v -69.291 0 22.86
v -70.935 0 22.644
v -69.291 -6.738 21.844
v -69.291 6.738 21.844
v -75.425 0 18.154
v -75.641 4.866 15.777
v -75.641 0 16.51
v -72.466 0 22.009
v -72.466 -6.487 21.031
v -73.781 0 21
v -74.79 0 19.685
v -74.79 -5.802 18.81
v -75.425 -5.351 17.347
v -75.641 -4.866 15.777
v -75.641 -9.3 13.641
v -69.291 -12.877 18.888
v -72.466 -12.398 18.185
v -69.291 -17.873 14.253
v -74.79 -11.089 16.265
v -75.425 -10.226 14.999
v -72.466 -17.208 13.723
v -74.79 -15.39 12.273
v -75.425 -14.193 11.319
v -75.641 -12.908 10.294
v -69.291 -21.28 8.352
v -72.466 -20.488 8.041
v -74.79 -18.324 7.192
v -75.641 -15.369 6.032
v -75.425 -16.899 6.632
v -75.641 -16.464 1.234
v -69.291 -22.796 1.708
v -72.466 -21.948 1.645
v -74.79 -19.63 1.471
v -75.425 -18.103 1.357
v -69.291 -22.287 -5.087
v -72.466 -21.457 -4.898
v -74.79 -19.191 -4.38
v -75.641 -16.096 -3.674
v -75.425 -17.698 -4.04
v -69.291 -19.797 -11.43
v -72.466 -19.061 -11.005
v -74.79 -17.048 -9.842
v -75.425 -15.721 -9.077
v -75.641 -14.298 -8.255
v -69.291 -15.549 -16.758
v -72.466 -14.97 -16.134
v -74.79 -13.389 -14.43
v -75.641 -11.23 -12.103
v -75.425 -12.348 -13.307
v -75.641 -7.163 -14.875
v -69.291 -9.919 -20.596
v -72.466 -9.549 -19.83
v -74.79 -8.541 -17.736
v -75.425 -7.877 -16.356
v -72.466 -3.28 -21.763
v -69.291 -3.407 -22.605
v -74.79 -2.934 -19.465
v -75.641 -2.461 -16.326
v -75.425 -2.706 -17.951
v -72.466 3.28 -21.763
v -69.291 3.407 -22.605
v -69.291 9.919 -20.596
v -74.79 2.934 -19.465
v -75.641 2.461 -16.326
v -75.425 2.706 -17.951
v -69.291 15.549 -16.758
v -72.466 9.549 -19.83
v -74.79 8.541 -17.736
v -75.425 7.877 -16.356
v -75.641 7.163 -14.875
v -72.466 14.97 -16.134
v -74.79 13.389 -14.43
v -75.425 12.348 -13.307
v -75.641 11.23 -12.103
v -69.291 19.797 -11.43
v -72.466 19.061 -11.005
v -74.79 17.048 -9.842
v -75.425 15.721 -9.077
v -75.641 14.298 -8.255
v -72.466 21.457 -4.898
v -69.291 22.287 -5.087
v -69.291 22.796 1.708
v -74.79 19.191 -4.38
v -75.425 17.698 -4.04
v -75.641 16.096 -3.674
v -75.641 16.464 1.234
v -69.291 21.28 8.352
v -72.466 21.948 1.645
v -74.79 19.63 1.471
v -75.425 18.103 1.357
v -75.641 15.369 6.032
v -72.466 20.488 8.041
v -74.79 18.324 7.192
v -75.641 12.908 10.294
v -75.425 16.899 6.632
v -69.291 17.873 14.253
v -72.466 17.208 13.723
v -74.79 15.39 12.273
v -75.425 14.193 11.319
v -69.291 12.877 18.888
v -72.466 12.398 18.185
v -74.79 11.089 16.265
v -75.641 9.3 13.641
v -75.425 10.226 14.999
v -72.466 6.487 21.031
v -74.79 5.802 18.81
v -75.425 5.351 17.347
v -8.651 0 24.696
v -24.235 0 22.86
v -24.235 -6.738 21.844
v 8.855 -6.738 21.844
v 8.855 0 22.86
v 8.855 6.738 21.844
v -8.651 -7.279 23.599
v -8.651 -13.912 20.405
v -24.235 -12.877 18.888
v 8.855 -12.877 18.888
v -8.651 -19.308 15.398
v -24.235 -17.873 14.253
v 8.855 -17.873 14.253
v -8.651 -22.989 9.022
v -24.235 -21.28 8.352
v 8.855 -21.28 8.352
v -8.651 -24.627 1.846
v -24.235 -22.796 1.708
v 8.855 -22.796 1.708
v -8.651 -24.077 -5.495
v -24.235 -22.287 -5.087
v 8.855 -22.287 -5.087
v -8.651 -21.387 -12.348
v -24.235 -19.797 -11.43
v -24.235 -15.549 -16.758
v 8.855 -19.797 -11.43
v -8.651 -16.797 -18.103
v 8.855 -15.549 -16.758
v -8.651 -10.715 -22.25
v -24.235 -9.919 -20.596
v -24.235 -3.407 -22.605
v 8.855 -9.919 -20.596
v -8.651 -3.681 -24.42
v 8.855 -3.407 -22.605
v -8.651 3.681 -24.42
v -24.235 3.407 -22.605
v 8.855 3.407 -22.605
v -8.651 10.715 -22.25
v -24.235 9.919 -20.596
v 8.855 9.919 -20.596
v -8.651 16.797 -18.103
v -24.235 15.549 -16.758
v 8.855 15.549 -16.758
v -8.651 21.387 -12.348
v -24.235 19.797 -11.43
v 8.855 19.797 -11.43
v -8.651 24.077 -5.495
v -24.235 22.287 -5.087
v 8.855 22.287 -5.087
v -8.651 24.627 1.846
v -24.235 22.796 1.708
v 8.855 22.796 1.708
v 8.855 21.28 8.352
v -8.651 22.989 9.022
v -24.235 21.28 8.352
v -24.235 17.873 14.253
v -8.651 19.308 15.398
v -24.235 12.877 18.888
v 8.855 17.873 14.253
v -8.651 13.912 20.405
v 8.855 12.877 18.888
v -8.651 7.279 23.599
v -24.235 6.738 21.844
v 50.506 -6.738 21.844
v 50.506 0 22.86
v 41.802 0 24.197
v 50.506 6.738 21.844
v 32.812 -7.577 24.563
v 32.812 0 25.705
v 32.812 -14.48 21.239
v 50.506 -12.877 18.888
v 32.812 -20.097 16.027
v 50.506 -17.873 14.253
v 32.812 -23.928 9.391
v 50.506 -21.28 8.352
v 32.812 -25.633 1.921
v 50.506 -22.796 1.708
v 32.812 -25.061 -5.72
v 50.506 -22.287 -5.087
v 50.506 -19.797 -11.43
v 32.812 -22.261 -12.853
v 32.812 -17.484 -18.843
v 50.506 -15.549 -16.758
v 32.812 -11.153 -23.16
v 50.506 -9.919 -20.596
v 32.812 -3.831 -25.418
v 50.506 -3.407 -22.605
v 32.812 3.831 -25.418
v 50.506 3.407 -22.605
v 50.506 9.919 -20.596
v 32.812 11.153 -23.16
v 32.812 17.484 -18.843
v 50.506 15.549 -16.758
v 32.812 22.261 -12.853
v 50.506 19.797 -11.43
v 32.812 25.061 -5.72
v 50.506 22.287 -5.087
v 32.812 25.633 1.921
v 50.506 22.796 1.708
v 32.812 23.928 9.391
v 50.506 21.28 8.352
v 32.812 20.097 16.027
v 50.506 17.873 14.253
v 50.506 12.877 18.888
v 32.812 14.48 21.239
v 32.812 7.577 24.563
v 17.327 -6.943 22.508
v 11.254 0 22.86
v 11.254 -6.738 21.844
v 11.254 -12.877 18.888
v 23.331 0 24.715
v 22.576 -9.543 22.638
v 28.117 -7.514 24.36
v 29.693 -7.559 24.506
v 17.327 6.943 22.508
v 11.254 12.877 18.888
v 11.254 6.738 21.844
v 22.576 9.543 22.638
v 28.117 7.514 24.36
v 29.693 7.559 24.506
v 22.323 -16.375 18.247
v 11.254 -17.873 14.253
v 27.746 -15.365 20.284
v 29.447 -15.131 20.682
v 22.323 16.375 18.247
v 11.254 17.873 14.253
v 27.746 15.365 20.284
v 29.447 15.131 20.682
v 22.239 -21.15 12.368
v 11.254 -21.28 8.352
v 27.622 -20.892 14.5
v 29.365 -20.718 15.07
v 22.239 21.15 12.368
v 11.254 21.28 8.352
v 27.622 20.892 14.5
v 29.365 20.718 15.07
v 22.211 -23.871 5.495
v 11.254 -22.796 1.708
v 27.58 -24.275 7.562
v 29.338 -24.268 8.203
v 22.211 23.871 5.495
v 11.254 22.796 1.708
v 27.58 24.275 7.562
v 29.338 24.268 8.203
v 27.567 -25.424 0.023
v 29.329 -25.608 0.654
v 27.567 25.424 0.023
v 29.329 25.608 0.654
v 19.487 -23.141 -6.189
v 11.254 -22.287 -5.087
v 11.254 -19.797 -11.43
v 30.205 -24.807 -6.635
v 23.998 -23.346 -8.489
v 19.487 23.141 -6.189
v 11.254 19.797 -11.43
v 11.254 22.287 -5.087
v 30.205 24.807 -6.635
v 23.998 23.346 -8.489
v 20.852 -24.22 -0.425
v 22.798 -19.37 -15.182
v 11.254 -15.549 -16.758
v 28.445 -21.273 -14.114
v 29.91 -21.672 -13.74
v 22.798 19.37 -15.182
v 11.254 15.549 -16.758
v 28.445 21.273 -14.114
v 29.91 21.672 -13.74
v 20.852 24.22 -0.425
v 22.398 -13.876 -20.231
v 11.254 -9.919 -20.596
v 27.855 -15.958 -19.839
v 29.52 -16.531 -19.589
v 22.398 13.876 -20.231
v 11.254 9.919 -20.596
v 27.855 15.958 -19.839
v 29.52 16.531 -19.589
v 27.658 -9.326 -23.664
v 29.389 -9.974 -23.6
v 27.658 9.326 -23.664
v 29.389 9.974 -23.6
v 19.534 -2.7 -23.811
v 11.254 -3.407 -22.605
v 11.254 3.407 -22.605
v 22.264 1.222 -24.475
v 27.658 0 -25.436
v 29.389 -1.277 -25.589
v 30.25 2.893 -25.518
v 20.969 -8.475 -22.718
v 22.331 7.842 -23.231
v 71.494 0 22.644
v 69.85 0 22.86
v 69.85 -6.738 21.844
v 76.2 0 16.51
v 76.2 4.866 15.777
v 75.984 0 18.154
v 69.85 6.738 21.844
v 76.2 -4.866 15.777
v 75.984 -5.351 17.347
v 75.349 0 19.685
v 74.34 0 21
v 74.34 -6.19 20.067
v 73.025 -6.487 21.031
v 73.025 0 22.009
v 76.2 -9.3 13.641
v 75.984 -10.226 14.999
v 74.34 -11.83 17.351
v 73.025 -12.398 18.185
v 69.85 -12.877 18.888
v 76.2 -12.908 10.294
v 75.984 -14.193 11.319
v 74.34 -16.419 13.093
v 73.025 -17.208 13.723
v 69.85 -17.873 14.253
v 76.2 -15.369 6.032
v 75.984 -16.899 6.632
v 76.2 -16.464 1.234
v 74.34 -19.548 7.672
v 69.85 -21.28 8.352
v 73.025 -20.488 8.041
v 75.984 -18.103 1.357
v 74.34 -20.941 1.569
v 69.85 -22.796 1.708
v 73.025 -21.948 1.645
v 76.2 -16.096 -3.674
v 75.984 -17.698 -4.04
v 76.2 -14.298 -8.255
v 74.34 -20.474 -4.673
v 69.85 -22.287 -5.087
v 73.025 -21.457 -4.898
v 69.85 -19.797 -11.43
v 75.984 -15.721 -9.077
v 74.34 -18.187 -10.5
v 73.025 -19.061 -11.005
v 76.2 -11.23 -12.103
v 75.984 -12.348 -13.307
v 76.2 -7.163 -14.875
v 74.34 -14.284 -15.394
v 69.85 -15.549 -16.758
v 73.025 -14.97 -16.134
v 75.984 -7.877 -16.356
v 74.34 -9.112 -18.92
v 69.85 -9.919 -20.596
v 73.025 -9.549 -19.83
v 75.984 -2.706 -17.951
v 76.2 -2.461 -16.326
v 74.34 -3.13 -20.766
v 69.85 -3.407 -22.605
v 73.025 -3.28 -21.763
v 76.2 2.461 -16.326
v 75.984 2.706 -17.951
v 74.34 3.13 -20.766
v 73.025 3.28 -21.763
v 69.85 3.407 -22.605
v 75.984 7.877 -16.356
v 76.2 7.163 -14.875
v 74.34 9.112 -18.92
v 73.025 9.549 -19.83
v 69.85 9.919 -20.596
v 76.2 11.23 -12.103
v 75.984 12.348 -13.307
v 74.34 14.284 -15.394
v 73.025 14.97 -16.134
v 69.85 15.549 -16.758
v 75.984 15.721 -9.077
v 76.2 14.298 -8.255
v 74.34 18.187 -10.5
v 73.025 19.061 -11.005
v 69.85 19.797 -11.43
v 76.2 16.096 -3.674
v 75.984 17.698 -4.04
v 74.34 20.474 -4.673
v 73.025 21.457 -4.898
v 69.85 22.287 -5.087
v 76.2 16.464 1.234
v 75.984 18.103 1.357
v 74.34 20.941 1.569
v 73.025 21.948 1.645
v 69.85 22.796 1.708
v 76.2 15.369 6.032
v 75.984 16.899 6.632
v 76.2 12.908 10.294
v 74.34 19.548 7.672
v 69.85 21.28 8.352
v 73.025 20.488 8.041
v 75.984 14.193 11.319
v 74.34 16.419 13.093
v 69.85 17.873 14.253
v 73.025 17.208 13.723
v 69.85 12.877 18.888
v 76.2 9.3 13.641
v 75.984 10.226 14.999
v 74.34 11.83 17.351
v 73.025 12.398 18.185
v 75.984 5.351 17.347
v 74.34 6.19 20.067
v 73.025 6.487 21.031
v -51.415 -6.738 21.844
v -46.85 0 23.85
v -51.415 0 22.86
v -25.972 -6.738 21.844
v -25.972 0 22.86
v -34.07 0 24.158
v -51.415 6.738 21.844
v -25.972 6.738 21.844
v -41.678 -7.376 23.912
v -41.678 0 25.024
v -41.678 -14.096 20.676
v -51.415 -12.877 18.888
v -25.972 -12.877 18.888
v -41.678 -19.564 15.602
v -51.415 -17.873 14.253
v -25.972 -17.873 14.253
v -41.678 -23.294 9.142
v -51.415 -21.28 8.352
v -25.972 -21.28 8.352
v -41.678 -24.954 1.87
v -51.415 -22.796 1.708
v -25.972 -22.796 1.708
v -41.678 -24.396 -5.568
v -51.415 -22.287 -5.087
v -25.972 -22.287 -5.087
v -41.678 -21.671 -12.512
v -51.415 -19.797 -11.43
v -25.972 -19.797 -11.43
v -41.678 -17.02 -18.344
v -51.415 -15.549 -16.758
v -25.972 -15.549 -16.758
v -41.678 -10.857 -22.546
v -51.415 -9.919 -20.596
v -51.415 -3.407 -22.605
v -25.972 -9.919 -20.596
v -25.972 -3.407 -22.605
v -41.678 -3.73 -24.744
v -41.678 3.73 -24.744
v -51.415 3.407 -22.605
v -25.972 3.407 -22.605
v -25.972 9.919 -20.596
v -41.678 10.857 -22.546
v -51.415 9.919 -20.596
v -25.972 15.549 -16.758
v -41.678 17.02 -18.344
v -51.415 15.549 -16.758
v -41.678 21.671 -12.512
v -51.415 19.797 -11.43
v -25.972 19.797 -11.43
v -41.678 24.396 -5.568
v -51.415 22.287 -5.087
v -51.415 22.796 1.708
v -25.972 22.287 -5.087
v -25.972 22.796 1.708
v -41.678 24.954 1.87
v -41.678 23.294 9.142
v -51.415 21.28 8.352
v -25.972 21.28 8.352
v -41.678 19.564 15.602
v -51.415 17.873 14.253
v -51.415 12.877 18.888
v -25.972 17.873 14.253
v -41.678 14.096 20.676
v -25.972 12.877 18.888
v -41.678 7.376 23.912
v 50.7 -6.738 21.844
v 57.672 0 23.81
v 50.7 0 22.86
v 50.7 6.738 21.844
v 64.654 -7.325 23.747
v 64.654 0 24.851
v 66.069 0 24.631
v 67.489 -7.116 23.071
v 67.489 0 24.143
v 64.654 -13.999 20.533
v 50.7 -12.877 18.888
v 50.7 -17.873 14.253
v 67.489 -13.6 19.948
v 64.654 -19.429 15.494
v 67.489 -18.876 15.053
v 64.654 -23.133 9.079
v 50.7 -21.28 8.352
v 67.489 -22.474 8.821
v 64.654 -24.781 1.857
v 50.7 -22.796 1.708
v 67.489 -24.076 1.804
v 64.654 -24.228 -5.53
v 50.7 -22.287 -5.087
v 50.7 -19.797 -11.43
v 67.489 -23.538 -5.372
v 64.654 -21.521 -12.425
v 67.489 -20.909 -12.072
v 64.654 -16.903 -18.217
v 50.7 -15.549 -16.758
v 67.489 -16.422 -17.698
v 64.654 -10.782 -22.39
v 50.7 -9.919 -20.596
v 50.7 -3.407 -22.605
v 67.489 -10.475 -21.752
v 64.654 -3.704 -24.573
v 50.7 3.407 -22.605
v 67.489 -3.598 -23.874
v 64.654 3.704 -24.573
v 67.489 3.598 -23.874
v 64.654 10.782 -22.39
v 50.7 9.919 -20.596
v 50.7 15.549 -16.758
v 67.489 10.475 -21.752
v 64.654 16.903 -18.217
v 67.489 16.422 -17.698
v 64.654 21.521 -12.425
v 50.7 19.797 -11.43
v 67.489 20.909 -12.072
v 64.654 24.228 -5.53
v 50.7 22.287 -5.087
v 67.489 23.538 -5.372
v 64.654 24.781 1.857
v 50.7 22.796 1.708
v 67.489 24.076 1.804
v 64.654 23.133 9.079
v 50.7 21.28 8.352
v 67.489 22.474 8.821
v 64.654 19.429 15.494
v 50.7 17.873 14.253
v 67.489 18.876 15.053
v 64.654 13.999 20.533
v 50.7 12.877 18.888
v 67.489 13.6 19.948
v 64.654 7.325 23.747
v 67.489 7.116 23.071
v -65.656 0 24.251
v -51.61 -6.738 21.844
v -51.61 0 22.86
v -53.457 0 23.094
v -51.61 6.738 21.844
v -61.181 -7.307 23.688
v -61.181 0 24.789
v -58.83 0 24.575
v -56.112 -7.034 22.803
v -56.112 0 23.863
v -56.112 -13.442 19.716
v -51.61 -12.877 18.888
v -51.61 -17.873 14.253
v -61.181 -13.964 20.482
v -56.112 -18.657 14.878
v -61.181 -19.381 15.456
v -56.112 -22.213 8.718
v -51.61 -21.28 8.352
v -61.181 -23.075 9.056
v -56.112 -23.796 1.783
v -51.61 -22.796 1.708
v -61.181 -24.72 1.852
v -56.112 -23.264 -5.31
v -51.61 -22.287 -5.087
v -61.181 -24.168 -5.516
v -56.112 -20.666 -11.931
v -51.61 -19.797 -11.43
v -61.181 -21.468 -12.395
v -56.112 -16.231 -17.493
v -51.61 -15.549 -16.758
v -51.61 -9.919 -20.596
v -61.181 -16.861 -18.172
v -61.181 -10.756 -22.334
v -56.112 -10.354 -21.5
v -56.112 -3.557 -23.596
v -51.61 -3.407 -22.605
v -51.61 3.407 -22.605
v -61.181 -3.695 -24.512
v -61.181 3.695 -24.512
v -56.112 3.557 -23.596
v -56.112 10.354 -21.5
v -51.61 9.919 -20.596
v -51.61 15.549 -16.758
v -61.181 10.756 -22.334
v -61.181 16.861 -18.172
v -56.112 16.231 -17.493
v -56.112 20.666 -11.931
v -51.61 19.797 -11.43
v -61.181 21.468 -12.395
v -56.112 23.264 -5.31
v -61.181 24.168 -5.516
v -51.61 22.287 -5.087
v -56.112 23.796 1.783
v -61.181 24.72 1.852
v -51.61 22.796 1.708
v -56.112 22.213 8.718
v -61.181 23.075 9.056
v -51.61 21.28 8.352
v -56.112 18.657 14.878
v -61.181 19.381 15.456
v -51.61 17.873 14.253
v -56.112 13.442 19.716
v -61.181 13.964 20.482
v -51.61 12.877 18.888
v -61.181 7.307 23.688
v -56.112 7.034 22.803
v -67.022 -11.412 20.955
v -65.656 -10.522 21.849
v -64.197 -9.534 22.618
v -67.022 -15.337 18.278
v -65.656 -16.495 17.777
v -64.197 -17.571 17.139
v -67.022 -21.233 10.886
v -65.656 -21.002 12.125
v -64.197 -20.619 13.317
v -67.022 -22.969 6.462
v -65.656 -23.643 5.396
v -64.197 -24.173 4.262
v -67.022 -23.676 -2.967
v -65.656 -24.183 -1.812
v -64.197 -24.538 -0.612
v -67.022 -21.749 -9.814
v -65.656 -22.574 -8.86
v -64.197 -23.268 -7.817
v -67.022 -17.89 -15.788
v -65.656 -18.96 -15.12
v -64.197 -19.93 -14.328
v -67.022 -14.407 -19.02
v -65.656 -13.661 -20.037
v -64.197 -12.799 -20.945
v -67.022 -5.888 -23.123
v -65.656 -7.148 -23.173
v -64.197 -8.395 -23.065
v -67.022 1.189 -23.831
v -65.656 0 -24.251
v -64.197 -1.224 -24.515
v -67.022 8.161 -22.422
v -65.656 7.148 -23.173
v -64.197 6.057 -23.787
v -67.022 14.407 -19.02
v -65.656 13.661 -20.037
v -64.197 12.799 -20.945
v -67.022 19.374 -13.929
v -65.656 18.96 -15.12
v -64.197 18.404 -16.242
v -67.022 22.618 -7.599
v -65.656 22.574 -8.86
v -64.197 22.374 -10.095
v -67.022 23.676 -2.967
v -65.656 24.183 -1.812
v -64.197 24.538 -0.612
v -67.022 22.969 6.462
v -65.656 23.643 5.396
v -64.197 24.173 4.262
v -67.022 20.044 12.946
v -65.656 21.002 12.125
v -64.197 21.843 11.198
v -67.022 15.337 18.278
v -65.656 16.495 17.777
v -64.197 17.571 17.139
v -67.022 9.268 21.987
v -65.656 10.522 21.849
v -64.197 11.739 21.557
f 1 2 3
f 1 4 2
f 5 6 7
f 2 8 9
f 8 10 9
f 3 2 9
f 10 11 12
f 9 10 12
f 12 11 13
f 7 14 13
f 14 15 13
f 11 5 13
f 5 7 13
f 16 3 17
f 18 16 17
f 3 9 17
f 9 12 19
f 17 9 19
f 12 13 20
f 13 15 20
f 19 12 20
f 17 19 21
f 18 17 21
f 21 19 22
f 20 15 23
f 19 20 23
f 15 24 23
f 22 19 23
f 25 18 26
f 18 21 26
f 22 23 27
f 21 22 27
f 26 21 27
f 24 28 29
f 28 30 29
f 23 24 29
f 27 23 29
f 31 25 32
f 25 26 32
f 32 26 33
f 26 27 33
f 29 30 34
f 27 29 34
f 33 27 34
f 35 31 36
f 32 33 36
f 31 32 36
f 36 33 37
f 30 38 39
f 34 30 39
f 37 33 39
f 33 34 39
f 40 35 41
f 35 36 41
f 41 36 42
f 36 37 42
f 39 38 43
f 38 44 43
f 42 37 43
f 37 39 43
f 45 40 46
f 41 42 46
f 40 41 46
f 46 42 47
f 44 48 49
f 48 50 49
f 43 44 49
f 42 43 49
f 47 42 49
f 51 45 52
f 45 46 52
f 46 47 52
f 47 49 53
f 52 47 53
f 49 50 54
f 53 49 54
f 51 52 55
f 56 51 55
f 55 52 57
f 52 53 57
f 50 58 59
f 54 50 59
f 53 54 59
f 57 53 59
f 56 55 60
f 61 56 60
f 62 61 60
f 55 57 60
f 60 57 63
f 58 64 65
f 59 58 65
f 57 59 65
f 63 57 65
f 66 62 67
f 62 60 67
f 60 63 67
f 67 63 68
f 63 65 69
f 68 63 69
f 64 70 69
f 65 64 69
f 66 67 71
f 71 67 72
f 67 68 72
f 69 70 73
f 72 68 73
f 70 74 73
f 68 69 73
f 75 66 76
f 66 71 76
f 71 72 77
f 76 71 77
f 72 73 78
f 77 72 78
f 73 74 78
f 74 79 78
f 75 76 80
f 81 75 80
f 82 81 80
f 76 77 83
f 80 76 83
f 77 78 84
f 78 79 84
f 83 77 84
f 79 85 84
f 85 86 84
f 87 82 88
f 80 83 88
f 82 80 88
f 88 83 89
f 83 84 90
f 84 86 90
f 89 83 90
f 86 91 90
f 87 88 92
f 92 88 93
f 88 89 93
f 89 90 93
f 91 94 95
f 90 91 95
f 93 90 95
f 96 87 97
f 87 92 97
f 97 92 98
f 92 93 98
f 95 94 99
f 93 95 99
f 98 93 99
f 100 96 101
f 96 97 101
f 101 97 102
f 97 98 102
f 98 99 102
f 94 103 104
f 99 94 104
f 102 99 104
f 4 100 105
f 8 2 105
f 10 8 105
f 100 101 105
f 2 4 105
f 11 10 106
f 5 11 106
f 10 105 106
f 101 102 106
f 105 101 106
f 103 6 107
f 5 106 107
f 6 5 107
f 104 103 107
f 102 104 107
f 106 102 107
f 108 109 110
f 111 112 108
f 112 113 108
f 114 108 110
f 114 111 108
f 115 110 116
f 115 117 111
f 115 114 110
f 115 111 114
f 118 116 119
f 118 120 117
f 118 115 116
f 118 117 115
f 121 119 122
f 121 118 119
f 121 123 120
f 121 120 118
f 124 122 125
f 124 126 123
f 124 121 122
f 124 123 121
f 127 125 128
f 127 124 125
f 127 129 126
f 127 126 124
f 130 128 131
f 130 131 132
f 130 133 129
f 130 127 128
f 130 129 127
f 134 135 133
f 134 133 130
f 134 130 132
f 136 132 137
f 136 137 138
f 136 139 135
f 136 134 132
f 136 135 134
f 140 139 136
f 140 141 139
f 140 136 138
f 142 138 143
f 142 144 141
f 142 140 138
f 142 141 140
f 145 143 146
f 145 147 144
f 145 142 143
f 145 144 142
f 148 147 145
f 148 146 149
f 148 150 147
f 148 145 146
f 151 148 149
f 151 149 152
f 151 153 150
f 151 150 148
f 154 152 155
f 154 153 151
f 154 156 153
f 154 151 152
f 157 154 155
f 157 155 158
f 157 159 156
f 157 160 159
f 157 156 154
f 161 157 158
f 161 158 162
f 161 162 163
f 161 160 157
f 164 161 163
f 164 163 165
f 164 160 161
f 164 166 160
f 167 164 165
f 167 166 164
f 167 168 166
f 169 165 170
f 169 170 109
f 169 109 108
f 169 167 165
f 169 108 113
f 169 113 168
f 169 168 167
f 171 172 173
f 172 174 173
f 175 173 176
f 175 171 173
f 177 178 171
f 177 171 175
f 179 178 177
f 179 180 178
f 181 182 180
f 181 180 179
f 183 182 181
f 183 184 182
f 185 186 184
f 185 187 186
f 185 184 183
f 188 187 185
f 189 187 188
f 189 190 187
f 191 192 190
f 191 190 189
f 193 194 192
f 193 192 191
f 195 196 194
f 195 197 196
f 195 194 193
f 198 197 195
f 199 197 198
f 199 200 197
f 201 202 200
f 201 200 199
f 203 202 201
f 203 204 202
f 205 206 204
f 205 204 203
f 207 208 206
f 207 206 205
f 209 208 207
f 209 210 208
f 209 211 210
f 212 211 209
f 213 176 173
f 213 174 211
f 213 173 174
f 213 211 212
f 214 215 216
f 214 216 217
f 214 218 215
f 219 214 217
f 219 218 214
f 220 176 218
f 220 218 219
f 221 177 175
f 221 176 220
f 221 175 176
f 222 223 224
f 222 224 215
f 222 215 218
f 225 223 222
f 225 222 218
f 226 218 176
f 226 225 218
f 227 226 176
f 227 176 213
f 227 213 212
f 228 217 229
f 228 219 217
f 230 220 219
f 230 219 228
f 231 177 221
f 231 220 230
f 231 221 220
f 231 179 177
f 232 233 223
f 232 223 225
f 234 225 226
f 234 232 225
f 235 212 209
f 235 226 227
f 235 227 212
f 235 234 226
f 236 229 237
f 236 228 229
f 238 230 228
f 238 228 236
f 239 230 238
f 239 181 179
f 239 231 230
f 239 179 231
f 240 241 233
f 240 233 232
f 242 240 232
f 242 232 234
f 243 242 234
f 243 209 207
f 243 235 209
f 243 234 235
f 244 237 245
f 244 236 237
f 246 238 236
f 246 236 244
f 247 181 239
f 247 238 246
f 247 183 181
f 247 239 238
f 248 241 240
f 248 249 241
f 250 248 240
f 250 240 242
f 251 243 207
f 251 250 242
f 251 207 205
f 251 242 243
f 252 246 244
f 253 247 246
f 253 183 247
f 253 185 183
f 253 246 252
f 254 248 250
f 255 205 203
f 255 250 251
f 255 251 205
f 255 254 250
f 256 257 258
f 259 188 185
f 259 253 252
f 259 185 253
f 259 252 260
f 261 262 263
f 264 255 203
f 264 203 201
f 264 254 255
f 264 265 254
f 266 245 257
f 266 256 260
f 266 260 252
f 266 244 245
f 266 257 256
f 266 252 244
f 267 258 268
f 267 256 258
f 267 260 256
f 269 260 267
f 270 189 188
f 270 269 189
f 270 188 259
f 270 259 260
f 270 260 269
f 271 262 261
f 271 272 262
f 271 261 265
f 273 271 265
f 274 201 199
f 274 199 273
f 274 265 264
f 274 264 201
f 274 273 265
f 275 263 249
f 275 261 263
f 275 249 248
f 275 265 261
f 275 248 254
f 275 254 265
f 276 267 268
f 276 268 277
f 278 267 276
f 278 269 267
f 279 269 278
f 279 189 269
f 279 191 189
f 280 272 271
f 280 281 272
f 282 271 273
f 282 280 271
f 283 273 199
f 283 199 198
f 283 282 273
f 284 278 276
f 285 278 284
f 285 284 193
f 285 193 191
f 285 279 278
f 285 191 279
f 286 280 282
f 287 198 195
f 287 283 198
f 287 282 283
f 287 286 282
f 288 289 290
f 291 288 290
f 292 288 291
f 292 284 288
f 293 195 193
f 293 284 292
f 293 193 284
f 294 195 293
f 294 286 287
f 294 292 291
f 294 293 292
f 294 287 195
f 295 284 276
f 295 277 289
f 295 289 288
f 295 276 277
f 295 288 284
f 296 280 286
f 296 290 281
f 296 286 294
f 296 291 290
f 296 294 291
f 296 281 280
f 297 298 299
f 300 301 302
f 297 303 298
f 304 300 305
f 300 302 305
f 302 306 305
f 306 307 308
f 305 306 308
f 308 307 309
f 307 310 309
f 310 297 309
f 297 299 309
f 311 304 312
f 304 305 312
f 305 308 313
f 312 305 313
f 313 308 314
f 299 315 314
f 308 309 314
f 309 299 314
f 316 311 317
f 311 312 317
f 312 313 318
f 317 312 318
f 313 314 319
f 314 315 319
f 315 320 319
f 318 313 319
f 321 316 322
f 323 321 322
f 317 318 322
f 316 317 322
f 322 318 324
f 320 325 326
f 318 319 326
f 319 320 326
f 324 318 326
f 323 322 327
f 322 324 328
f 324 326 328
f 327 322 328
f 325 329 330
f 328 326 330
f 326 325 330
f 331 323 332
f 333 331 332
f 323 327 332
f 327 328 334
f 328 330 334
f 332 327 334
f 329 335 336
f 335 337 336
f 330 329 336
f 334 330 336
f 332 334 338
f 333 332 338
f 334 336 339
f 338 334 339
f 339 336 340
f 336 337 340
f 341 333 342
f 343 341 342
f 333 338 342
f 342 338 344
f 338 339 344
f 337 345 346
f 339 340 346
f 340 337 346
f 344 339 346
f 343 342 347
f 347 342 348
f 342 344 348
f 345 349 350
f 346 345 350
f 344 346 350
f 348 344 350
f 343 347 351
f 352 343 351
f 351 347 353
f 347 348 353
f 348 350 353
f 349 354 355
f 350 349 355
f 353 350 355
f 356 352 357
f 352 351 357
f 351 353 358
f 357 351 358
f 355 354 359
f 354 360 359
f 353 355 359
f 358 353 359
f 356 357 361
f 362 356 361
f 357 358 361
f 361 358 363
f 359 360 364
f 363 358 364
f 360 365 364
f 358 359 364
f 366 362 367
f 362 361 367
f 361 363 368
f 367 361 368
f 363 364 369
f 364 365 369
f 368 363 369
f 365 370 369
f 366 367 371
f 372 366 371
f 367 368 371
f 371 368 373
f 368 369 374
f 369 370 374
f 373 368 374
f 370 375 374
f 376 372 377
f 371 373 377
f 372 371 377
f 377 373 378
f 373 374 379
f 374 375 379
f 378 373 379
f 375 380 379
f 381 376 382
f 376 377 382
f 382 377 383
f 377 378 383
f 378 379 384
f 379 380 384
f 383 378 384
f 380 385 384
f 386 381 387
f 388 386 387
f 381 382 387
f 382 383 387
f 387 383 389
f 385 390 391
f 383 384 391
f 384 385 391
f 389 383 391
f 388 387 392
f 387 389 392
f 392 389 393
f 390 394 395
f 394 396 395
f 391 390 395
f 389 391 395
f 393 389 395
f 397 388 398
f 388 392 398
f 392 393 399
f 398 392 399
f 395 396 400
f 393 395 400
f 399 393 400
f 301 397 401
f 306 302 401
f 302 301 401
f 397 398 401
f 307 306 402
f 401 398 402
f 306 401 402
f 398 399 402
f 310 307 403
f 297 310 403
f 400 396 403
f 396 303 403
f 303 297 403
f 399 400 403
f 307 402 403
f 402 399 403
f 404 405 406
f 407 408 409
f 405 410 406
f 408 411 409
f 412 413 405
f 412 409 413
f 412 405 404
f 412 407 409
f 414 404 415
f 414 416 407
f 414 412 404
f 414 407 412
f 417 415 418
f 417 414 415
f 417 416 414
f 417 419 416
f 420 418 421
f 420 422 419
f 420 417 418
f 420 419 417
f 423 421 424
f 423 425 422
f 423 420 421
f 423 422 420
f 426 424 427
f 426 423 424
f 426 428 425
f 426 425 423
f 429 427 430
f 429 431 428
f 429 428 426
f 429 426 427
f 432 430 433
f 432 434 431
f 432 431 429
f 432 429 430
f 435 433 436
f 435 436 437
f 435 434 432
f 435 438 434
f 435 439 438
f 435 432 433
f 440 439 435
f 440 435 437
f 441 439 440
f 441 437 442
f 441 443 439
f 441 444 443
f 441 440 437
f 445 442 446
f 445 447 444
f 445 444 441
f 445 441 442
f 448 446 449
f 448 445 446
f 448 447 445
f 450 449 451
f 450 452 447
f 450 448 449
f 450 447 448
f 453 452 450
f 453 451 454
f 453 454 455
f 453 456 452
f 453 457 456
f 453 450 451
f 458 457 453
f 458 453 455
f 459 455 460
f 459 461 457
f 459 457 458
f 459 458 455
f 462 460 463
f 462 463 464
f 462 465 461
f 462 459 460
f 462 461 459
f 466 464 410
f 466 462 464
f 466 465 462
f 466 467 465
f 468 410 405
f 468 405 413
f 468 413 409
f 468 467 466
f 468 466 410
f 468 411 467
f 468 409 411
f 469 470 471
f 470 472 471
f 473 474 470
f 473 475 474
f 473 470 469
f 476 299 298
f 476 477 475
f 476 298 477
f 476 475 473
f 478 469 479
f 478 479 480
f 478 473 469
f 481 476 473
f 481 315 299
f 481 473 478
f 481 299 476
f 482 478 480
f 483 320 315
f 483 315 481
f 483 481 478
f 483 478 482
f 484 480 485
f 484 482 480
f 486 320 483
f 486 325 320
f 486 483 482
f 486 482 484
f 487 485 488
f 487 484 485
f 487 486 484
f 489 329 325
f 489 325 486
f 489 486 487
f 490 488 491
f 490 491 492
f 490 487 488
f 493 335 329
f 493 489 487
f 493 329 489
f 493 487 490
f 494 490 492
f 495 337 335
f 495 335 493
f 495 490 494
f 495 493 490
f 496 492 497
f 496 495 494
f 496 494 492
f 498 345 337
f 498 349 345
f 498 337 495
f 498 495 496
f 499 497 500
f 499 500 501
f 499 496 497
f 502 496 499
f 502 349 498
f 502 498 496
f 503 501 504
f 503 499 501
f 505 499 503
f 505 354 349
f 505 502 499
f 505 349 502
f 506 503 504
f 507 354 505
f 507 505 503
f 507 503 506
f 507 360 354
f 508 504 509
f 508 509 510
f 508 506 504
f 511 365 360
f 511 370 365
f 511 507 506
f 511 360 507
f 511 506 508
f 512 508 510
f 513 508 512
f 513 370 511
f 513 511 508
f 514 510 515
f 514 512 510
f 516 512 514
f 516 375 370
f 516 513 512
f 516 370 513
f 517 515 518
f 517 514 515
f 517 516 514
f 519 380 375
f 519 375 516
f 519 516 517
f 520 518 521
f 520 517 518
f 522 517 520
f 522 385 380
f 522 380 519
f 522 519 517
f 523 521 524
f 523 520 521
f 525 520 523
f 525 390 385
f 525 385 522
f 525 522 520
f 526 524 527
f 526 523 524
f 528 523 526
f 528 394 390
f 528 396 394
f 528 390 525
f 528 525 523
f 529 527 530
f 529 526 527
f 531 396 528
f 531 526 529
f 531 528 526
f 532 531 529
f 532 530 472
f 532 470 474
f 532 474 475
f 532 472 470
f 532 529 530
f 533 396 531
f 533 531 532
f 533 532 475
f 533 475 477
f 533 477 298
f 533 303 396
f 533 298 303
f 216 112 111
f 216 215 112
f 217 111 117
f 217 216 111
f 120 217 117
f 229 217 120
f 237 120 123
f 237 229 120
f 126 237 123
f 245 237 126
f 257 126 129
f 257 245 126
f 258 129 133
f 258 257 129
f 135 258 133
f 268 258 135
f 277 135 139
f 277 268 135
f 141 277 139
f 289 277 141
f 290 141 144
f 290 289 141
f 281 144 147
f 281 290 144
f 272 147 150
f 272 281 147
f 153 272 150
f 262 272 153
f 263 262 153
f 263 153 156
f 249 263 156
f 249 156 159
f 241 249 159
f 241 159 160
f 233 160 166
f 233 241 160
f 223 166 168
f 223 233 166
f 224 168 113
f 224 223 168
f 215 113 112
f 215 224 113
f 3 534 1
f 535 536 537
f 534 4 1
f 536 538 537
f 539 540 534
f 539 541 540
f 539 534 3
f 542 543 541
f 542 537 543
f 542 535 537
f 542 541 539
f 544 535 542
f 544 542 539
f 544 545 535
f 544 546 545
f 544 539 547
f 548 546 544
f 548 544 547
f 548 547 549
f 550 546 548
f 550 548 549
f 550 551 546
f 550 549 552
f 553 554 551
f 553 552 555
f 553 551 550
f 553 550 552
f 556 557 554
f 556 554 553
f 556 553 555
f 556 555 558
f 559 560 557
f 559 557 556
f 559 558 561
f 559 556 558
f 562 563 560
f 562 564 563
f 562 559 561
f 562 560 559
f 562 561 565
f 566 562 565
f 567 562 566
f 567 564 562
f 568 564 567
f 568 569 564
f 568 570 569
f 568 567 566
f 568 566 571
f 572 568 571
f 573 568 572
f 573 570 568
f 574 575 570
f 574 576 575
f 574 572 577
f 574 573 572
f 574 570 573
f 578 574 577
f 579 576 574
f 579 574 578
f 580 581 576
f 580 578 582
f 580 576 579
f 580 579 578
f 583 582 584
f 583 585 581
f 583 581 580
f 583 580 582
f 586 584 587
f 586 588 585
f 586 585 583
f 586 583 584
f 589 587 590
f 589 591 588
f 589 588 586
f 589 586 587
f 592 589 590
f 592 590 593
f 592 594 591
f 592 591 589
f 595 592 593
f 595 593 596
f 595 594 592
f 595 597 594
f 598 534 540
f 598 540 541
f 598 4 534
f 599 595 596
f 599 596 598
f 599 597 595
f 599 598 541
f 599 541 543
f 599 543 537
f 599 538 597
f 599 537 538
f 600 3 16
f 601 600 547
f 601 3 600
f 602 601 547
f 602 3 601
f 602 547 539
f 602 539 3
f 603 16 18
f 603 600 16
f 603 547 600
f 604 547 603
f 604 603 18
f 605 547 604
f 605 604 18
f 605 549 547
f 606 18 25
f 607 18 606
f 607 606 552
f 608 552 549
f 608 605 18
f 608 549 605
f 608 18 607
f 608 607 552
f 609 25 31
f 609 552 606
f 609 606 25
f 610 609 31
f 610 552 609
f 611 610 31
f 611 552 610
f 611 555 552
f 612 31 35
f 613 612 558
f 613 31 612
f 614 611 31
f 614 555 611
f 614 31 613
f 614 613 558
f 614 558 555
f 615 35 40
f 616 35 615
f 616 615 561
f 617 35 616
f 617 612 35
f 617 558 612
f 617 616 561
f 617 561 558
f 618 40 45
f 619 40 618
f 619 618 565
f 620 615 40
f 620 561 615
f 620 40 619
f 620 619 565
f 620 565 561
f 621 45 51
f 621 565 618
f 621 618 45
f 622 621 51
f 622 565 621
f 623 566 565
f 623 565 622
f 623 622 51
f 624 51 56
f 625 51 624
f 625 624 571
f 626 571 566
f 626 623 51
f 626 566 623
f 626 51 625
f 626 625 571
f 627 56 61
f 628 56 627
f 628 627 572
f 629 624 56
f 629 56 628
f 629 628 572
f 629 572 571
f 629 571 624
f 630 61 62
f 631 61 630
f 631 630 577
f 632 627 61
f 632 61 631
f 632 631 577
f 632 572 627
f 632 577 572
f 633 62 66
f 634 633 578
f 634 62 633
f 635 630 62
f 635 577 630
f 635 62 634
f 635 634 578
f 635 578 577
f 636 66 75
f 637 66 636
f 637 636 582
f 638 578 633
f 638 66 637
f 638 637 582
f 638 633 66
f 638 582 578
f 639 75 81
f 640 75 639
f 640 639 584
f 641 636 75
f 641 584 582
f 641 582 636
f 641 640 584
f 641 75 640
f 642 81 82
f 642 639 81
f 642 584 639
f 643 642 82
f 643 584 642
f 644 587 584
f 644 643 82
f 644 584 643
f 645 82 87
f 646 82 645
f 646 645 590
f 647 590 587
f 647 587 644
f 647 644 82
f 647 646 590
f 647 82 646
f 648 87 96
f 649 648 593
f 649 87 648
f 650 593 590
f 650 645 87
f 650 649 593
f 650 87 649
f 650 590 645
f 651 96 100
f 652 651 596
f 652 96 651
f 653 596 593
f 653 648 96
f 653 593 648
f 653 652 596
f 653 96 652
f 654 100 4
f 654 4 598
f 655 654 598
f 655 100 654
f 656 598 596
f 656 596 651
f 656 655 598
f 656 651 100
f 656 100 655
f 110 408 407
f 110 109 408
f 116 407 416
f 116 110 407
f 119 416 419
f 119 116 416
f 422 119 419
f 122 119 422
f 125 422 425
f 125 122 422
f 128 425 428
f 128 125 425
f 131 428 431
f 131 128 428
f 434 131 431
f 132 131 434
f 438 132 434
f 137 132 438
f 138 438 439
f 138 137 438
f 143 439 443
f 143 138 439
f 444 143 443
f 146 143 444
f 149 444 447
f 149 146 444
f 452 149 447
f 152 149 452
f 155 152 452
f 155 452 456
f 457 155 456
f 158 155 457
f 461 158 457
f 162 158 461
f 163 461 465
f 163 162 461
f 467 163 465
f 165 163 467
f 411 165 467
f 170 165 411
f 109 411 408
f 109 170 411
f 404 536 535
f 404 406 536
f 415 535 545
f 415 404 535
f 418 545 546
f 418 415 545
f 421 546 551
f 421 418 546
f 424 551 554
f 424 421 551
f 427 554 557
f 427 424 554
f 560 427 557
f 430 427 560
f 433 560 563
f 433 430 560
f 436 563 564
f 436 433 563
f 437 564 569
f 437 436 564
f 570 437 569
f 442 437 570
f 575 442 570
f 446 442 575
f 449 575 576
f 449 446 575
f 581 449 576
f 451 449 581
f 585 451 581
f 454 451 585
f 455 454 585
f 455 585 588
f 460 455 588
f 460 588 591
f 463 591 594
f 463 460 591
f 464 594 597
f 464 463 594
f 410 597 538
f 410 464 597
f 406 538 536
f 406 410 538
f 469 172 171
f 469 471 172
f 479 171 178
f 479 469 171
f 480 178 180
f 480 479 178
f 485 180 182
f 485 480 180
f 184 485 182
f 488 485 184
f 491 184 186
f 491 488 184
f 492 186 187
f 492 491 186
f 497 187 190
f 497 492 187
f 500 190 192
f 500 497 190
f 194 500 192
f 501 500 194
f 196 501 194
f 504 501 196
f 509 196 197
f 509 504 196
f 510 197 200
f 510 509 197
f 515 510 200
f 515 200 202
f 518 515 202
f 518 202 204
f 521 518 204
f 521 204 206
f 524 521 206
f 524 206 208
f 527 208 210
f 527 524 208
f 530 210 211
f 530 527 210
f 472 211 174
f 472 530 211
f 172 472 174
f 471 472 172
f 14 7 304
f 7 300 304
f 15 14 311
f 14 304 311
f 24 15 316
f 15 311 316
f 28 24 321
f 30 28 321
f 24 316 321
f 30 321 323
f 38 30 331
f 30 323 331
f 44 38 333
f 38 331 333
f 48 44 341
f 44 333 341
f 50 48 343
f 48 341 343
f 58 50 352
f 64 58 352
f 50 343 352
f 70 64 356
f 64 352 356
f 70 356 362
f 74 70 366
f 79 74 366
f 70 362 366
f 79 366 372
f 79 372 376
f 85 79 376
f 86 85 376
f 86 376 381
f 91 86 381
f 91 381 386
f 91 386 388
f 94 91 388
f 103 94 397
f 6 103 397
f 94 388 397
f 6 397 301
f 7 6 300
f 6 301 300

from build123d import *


with BuildPart() as f1:
    # F0 (on Front) → F1 (revolve)
    with BuildSketch(Plane.XZ):
        with BuildLine():
            Line((-75.6412, 16.51), (76.2, 16.51))
            ThreePointArc((76.2, 16.51), (74.3401280605, 21.0001280605), (69.85, 22.86))
            Line((69.85, 22.86), (50.7000796497, 22.86))
            add(Edge.make_bspline(
                [(50.5058497264, 22.86), (50.5706057369, 22.8596754076), (50.6353489577, 22.8596730925), (50.7000796497, 22.86)],
                knots=[0.8323923136, 0.8323923136, 0.8323923136, 0.8323923136, 0.8336677213, 0.8336677213, 0.8336677213, 0.8336677213], degree=3))
            Line((50.5058497264, 22.86), (11.2541196868, 22.86))
            add(Edge.make_bspline(
                [(8.8545044549, 22.86), (9.654443387, 22.8335928328), (10.4546819055, 22.8313514547), (11.2541196868, 22.86)],
                knots=[0.5777964989, 0.5777964989, 0.5777964989, 0.5777964989, 0.5916792469, 0.5916792469, 0.5916792469, 0.5916792469], degree=3))
            Line((8.8545044549, 22.86), (-24.2349496389, 22.86))
            add(Edge.make_bspline(
                [(-25.9719379246, 22.86), (-25.3904076002, 22.836978978), (-24.8117447825, 22.8386038349), (-24.2349496389, 22.86)],
                knots=[0.357508186, 0.357508186, 0.357508186, 0.357508186, 0.3692777281, 0.3692777281, 0.3692777281, 0.3692777281], degree=3))
            Line((-25.9719379246, 22.86), (-51.4154396951, 22.86))
            add(Edge.make_bspline(
                [(-51.6103026405, 22.86), (-51.5454772703, 22.8591105526), (-51.4805272698, 22.8590976396), (-51.4154396951, 22.86)],
                knots=[0.1618012553, 0.1618012553, 0.1618012553, 0.1618012553, 0.1637198302, 0.1637198302, 0.1637198302, 0.1637198302], degree=3))
            Line((-51.6103026405, 22.86), (-69.2912, 22.86))
            ThreePointArc((-69.2912, 22.86), (-73.7813280605, 21.0001280605), (-75.6412, 16.51))
        make_face()
        with BuildLine():
            Line((50.7000796497, 22.86), (69.85, 22.86))
            add(Edge.make_bspline(
                [(50.7000796497, 22.86), (55.8146208152, 22.8858298184), (64.1273713818, 26.3209146353), (68.2820749394, 23.807391724), (69.85, 22.86)],
                knots=[0.8336677213, 0.8336677213, 0.8336677213, 0.8336677213, 0.9344410153, 1, 1, 1, 1], degree=3))
        make_face()
        with BuildLine():
            add(Edge.make_bspline(
                [(-69.2912, 22.86), (-67.0878619126, 24.1767972382), (-59.2480814587, 25.9249777514), (-54.201168592, 22.8955484125), (-51.6103026405, 22.86)],
                knots=[0, 0, 0, 0, 0.0851218586, 0.1618012553, 0.1618012553, 0.1618012553, 0.1618012553], degree=3))
            Line((-69.2912, 22.86), (-51.6103026405, 22.86))
        make_face()
        with BuildLine():
            Line((11.2541196868, 22.86), (50.5058497264, 22.86))
            add(Edge.make_bspline(
                [(11.2541196868, 22.86), (18.4729734076, 23.1186938759), (32.2090595343, 28.4518581182), (44.6490527547, 22.8893574606), (50.5058497264, 22.86)],
                knots=[0.5916792469, 0.5916792469, 0.5916792469, 0.5916792469, 0.717039256, 0.8323923136, 0.8323923136, 0.8323923136, 0.8323923136], degree=3))
        make_face()
        with BuildLine():
            add(Edge.make_bspline(
                [(-51.4154396951, 22.86), (-48.4856501908, 22.900617985), (-41.2858930569, 27.153149401), (-31.279904219, 23.0701262886), (-25.9719379246, 22.86)],
                knots=[0.1637198302, 0.1637198302, 0.1637198302, 0.1637198302, 0.2500807141, 0.357508186, 0.357508186, 0.357508186, 0.357508186], degree=3))
            Line((-51.4154396951, 22.86), (-25.9719379246, 22.86))
        make_face()
        with BuildLine():
            Line((-24.2349496389, 22.86), (8.8545044549, 22.86))
            add(Edge.make_bspline(
                [(-24.2349496389, 22.86), (-19.4137140956, 23.0388433081), (-9.4713243481, 26.34582534), (2.5080525383, 23.0695057634), (8.8545044549, 22.86)],
                knots=[0.3692777281, 0.3692777281, 0.3692777281, 0.3692777281, 0.4676553499, 0.5777964989, 0.5777964989, 0.5777964989, 0.5777964989], degree=3))
        make_face()
    revolve(axis=Axis((38.1, 0, 0), (1, 0, 0)))


solid = f1.part
